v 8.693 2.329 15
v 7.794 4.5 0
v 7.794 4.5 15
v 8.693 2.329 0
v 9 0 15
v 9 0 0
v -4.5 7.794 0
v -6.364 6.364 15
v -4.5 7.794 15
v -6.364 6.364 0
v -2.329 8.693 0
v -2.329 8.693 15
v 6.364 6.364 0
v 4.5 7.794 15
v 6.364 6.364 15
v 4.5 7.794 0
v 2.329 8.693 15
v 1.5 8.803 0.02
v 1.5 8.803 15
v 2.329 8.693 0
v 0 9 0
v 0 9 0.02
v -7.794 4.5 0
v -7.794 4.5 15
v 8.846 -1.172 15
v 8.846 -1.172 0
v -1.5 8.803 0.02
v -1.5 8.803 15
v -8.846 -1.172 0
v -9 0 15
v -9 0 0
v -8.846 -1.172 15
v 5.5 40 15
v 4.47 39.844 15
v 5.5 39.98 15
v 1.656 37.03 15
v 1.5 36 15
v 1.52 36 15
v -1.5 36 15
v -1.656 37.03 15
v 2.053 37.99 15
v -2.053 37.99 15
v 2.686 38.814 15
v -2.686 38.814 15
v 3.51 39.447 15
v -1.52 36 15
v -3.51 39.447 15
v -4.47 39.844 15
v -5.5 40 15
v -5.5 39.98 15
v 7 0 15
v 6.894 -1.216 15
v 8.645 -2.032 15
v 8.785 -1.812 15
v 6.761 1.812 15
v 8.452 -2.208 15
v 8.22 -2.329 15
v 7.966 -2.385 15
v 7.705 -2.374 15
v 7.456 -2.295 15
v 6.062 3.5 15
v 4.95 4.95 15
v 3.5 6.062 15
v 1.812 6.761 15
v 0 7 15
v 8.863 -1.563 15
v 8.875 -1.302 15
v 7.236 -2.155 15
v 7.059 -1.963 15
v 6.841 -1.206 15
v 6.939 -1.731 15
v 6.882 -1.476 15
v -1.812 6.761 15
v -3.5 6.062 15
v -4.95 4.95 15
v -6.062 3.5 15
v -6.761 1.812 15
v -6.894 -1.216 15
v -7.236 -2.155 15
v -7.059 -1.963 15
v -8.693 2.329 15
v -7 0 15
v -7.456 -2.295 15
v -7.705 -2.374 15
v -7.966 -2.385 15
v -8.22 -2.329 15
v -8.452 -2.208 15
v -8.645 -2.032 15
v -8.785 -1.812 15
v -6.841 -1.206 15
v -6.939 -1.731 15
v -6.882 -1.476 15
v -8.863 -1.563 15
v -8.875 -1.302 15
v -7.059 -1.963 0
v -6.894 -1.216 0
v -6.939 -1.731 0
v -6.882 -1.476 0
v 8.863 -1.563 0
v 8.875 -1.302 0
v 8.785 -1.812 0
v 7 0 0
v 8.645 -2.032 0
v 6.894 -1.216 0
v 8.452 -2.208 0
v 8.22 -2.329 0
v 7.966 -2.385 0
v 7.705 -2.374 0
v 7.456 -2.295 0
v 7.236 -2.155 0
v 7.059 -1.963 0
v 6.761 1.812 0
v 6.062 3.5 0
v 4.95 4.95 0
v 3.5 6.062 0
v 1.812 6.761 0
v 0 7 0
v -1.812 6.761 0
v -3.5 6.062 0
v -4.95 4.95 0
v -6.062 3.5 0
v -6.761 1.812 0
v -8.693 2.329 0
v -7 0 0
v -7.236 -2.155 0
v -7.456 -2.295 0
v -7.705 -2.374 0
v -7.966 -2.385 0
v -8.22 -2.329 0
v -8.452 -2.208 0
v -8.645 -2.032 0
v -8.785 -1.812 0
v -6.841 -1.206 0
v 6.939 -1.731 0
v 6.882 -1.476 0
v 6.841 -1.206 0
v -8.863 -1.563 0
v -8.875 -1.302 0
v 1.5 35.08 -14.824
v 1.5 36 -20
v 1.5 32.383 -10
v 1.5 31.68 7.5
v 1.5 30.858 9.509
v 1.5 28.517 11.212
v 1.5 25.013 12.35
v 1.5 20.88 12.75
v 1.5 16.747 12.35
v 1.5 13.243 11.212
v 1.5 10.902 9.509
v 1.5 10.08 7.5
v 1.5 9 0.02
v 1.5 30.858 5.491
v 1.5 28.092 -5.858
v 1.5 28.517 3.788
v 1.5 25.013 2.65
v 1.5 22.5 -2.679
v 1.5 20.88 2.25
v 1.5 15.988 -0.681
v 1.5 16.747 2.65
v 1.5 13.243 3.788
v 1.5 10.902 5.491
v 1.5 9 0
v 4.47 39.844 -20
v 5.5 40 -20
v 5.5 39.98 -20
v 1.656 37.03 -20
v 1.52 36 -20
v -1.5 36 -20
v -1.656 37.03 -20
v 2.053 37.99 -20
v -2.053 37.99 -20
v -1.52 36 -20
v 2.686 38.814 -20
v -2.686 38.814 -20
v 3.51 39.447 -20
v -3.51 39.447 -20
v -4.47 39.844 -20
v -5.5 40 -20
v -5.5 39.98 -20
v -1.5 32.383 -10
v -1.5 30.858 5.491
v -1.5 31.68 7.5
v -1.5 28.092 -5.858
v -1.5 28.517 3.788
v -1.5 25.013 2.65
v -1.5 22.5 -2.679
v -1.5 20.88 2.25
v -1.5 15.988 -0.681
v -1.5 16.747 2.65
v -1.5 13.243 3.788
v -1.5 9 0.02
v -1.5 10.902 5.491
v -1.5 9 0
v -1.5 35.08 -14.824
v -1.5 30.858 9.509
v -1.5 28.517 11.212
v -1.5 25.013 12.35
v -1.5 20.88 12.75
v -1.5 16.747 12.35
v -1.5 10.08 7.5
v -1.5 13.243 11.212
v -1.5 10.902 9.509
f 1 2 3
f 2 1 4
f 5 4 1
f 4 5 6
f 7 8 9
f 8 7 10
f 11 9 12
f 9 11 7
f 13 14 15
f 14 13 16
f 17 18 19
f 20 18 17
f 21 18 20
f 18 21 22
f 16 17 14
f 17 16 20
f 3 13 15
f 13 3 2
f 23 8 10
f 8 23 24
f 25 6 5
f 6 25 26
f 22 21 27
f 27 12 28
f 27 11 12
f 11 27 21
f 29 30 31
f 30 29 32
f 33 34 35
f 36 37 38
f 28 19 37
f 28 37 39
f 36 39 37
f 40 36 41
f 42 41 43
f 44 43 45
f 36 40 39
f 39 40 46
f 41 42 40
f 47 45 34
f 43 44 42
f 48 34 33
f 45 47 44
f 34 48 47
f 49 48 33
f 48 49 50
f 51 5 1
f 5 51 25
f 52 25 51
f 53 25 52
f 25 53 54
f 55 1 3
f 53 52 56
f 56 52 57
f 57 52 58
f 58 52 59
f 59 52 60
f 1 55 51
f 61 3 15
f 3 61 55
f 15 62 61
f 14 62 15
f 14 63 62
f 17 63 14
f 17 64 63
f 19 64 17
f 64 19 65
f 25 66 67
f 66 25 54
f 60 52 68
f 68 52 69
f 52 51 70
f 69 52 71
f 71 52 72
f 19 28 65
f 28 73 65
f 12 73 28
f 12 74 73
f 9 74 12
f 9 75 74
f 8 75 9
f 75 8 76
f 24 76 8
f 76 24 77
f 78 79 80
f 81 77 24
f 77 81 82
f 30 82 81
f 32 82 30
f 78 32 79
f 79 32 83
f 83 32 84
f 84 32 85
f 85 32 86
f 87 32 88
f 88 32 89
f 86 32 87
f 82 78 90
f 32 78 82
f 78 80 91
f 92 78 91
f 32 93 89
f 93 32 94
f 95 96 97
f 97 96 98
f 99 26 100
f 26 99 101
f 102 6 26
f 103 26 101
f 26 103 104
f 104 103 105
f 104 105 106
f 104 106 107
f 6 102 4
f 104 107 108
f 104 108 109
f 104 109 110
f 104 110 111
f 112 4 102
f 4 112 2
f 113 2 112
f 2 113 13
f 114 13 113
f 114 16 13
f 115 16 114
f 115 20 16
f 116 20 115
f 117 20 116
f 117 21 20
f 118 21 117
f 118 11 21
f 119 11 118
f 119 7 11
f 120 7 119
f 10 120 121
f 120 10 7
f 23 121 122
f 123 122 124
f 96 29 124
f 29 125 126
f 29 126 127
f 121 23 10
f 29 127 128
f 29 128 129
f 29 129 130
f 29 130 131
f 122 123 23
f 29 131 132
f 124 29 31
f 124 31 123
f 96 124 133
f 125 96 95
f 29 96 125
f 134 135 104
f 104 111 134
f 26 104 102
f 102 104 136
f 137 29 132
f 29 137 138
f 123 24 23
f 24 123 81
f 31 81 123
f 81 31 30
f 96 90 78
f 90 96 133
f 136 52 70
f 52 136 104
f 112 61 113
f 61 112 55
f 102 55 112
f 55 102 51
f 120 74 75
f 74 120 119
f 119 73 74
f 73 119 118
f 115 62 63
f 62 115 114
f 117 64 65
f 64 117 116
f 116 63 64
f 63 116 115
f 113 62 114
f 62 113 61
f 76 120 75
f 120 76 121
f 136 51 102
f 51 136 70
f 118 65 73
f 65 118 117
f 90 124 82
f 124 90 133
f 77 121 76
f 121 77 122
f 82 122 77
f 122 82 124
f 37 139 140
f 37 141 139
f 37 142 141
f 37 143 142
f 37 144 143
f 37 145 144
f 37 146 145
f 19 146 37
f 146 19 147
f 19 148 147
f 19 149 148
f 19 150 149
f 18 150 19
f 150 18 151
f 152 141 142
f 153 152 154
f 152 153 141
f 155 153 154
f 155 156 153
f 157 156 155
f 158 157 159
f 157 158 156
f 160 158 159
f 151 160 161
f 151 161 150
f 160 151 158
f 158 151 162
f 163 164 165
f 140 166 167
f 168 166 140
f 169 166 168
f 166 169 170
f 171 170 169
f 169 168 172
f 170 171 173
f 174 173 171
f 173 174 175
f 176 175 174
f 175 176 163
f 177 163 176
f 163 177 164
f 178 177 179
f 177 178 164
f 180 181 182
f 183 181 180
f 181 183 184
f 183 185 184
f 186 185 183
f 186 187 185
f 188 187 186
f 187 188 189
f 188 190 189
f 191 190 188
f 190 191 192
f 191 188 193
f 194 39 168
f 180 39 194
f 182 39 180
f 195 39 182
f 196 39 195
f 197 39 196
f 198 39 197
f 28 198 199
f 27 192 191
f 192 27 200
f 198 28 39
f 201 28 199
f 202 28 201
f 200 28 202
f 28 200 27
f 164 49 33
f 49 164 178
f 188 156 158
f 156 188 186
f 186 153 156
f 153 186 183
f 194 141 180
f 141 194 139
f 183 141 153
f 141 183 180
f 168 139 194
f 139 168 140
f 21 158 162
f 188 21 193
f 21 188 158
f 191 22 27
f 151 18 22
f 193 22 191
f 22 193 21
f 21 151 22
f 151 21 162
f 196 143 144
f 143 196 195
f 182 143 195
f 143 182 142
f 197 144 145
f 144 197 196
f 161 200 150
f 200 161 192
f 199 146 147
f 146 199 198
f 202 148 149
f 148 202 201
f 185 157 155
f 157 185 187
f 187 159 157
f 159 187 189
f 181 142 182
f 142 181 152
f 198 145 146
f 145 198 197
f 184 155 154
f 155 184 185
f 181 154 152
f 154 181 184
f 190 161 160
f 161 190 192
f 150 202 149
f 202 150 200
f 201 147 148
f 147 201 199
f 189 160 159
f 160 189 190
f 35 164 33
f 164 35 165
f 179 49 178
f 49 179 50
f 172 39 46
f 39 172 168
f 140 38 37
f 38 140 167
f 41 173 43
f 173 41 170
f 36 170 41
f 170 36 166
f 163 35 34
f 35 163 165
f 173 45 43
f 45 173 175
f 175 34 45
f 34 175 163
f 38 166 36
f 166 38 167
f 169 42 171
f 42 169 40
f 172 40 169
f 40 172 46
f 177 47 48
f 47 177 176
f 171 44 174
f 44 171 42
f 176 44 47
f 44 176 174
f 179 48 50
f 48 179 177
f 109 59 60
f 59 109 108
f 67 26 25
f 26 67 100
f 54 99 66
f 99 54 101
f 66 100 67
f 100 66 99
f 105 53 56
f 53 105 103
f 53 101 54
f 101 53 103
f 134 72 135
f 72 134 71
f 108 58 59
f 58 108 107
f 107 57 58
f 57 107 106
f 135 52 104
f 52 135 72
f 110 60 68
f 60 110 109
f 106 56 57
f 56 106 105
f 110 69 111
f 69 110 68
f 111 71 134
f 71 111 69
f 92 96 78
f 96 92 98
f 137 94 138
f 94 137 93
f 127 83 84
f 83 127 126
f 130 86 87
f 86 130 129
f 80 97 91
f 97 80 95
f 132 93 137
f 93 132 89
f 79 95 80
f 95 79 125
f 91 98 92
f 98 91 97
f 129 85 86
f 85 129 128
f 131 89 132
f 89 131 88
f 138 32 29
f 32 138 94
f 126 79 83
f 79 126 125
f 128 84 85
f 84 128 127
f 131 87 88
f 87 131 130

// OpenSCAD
$fa=15;
$fs=0.2;

//wall distance to pipe (axial)
wd=40;
//pipe diameter
pd=14;
//clip thickness
ct=2;
//clip heigth
ch=15;
//clip apperture
ca=160;
//strut thickness
st=3;
//strut heigh
sh=20;
//strut min size
sms=4;
//should a hole be drilled through the strut (1) or not (0). value > 1 will result in havoc, 
//but floats in the 0-1 range will yeld fonctional results.
//for small clip heigth (<10) , it may be better to lower this a bit (for robustness). 
hole_in_strut=1;

w1=4*(pd/2+ct);

//wall
//translate([-100,wd,-100]) cube([200,2,200]);


	//--------- clip tuyau -------------------------------------------------------
	difference() {
		cylinder(h=ch,d=pd+ct*2);
		translate([0,0,-1]) linear_extrude(height = ch+2)	
			polygon(points=[[0,0],[-w1*cos(90+ca/2),-w1*sin(90+ca/2)],[w1,-w1],[-w1,-w1],[-w1*cos(90-ca/2),-w1*sin(90-ca/2)]]);
		translate([0,0,-100]) cylinder(h=200,d=pd);	
		}
	//cylindres au bout du clip
	rotate([0,0,-(180-ca)/2]) translate([(pd+ct)/2,0,0]) cylinder(h=ch,d=ct);
	rotate([0,0,180+(180-ca)/2]) translate([(pd+ct)/2,0,0]) cylinder(h=ch,d=ct);
	//--------- etai  -------------------------------------------------------
	//central strut
	difference() {
		translate([-st/2,pd/1.99,-sh])cube([st,wd-pd/1.99,sh+ch]);
		translate([0,pd/2+ct,-sh]) scale([st*5,wd-pd/2-sms-ct,sh])  rotate([0,90,0])cylinder(r=1,h=st*2,center=true);
		translate([(pd+ct)/-2,0,-sh+0.02]) cube([pd+ct,pd/2+ct,sh]);
		//hole through the strut
		translate([-st,pd/2+ct+(wd-sms-ct-pd/2)*0.44,ch/2]) rotate([90,0,90]) scale([(wd-sms-ct-pd/2)*0.8,ch*0.7,1])cylinder(d=hole_in_strut,h=st*2);
		}
	
	difference() {
	translate([-st/2-sms,wd-sms,-sh])cube([st+sms*2,sms,sh+ch]);
	translate([st/2+sms,wd-sms,-sh-1]) cylinder(h=sh+ch+2,d=sms*1.99);
	translate([st/-2-sms,wd-sms,-sh-1]) cylinder(h=sh+ch+2,d=sms*1.99);
	}
	
	
